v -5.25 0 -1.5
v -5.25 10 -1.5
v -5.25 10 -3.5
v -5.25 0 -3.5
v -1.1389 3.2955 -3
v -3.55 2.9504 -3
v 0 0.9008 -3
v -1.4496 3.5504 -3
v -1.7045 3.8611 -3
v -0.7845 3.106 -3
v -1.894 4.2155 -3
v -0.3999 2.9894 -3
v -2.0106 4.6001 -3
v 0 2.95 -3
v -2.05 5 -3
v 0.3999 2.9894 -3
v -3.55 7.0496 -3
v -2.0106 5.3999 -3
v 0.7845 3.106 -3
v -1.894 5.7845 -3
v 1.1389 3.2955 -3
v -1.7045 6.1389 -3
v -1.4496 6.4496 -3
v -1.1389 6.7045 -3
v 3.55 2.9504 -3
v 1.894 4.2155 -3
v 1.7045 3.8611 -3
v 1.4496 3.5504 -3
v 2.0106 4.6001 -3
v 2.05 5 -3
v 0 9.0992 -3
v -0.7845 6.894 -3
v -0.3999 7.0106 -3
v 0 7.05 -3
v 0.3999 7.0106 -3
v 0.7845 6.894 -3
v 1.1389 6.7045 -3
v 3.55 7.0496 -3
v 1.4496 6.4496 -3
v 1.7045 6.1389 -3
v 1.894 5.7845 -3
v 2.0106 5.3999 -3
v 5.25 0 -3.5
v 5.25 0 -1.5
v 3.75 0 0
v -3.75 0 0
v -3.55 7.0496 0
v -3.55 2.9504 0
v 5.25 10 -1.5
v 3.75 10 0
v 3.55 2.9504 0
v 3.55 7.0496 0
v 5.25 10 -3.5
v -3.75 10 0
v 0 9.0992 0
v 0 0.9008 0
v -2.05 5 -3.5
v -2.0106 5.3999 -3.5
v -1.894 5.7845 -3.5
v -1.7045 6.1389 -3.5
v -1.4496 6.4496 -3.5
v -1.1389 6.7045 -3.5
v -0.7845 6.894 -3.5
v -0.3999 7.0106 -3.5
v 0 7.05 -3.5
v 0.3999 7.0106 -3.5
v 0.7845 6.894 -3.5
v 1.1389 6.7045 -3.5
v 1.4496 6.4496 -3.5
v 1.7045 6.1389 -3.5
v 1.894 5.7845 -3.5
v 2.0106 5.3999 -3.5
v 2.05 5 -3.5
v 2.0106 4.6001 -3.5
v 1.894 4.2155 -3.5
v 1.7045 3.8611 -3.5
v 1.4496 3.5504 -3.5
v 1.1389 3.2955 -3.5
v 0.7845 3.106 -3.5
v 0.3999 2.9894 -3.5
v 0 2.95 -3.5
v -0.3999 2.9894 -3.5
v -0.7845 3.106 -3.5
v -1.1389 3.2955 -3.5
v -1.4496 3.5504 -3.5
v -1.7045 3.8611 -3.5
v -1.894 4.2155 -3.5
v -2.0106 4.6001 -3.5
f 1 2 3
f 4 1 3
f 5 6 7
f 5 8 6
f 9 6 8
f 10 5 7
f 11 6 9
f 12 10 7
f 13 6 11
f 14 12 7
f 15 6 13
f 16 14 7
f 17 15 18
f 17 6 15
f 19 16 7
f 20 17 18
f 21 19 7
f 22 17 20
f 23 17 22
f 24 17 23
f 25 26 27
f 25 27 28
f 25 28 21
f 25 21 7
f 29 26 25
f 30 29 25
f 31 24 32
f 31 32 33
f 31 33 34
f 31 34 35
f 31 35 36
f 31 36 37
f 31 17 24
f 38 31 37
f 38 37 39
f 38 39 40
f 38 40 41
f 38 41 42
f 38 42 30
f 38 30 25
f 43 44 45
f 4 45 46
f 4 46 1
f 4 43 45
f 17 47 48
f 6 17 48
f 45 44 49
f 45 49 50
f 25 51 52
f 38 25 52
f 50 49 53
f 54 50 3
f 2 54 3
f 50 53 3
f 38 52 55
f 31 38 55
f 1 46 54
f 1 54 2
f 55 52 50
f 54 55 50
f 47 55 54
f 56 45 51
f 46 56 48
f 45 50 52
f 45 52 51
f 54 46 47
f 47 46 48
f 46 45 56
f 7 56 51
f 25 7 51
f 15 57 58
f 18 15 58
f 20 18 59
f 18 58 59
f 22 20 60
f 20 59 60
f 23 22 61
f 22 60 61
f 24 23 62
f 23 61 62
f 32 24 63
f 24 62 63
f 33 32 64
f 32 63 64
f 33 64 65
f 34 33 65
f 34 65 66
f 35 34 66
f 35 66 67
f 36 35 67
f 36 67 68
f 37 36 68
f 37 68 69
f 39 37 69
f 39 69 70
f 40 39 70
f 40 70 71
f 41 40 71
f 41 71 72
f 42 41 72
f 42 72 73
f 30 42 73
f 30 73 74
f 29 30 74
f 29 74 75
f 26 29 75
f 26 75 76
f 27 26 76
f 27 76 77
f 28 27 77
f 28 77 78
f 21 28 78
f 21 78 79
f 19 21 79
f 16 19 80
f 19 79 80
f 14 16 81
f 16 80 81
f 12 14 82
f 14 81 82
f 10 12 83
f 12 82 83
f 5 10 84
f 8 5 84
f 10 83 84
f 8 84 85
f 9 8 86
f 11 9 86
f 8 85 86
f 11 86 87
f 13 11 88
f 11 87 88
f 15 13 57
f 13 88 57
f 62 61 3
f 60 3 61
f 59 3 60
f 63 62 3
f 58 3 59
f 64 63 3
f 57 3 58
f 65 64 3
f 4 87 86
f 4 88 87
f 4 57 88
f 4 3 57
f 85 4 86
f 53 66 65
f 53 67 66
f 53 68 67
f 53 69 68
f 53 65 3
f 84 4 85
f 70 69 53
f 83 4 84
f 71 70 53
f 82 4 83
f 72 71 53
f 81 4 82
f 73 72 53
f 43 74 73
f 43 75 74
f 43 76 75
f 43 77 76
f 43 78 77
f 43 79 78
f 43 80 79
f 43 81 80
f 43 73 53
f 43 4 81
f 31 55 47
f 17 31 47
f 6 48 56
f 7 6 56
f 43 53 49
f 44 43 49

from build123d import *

# Parameters (mm, degrees)
BOSS_EXTRU_1_DEPTH      = 10
ENL_V_MAT_EXTRU_2_DEPTH = 3
ESQUISSE5_R             = 2.05
ENL_V_MAT_EXTRU_3_DEPTH = 12.82423359


with BuildPart() as part:
    # Esquisse1 → Boss.-Extru.1 (new body)
    with BuildSketch(Plane(origin=(0, 0, 0), x_dir=(1, 0, 0), z_dir=(0, 1, 0))):
        Polygon((3.75, 0), (-3.75, 0), (-5.25, 1.5), (-5.25, 3.5), (5.25, 3.5), (5.25, 1.5), align=None)
    extrude(amount=BOSS_EXTRU_1_DEPTH)

    # Esquisse4 → Enlèv. mat.-Extru.2 (cut)
    with BuildSketch(Plane.XY):
        Polygon((3.55, 7.049593456), (0, 9.099186911), (-3.55, 7.049593456), (-3.55, 2.950406544), (0, 0.900813089), (3.55, 2.950406544), align=None)
    extrude(amount=-ENL_V_MAT_EXTRU_2_DEPTH, mode=Mode.SUBTRACT)

    # Esquisse5 → Enlèv. mat.-Extru.3 (cut, through all)
    with BuildSketch(Plane(origin=(0, 0, -3.5), x_dir=(-1, 0, 0), z_dir=(0, 0, -1))):
        with Locations((0, 5)):
            Circle(ESQUISSE5_R)
    extrude(amount=-ENL_V_MAT_EXTRU_3_DEPTH, mode=Mode.SUBTRACT)


solid = part.part
